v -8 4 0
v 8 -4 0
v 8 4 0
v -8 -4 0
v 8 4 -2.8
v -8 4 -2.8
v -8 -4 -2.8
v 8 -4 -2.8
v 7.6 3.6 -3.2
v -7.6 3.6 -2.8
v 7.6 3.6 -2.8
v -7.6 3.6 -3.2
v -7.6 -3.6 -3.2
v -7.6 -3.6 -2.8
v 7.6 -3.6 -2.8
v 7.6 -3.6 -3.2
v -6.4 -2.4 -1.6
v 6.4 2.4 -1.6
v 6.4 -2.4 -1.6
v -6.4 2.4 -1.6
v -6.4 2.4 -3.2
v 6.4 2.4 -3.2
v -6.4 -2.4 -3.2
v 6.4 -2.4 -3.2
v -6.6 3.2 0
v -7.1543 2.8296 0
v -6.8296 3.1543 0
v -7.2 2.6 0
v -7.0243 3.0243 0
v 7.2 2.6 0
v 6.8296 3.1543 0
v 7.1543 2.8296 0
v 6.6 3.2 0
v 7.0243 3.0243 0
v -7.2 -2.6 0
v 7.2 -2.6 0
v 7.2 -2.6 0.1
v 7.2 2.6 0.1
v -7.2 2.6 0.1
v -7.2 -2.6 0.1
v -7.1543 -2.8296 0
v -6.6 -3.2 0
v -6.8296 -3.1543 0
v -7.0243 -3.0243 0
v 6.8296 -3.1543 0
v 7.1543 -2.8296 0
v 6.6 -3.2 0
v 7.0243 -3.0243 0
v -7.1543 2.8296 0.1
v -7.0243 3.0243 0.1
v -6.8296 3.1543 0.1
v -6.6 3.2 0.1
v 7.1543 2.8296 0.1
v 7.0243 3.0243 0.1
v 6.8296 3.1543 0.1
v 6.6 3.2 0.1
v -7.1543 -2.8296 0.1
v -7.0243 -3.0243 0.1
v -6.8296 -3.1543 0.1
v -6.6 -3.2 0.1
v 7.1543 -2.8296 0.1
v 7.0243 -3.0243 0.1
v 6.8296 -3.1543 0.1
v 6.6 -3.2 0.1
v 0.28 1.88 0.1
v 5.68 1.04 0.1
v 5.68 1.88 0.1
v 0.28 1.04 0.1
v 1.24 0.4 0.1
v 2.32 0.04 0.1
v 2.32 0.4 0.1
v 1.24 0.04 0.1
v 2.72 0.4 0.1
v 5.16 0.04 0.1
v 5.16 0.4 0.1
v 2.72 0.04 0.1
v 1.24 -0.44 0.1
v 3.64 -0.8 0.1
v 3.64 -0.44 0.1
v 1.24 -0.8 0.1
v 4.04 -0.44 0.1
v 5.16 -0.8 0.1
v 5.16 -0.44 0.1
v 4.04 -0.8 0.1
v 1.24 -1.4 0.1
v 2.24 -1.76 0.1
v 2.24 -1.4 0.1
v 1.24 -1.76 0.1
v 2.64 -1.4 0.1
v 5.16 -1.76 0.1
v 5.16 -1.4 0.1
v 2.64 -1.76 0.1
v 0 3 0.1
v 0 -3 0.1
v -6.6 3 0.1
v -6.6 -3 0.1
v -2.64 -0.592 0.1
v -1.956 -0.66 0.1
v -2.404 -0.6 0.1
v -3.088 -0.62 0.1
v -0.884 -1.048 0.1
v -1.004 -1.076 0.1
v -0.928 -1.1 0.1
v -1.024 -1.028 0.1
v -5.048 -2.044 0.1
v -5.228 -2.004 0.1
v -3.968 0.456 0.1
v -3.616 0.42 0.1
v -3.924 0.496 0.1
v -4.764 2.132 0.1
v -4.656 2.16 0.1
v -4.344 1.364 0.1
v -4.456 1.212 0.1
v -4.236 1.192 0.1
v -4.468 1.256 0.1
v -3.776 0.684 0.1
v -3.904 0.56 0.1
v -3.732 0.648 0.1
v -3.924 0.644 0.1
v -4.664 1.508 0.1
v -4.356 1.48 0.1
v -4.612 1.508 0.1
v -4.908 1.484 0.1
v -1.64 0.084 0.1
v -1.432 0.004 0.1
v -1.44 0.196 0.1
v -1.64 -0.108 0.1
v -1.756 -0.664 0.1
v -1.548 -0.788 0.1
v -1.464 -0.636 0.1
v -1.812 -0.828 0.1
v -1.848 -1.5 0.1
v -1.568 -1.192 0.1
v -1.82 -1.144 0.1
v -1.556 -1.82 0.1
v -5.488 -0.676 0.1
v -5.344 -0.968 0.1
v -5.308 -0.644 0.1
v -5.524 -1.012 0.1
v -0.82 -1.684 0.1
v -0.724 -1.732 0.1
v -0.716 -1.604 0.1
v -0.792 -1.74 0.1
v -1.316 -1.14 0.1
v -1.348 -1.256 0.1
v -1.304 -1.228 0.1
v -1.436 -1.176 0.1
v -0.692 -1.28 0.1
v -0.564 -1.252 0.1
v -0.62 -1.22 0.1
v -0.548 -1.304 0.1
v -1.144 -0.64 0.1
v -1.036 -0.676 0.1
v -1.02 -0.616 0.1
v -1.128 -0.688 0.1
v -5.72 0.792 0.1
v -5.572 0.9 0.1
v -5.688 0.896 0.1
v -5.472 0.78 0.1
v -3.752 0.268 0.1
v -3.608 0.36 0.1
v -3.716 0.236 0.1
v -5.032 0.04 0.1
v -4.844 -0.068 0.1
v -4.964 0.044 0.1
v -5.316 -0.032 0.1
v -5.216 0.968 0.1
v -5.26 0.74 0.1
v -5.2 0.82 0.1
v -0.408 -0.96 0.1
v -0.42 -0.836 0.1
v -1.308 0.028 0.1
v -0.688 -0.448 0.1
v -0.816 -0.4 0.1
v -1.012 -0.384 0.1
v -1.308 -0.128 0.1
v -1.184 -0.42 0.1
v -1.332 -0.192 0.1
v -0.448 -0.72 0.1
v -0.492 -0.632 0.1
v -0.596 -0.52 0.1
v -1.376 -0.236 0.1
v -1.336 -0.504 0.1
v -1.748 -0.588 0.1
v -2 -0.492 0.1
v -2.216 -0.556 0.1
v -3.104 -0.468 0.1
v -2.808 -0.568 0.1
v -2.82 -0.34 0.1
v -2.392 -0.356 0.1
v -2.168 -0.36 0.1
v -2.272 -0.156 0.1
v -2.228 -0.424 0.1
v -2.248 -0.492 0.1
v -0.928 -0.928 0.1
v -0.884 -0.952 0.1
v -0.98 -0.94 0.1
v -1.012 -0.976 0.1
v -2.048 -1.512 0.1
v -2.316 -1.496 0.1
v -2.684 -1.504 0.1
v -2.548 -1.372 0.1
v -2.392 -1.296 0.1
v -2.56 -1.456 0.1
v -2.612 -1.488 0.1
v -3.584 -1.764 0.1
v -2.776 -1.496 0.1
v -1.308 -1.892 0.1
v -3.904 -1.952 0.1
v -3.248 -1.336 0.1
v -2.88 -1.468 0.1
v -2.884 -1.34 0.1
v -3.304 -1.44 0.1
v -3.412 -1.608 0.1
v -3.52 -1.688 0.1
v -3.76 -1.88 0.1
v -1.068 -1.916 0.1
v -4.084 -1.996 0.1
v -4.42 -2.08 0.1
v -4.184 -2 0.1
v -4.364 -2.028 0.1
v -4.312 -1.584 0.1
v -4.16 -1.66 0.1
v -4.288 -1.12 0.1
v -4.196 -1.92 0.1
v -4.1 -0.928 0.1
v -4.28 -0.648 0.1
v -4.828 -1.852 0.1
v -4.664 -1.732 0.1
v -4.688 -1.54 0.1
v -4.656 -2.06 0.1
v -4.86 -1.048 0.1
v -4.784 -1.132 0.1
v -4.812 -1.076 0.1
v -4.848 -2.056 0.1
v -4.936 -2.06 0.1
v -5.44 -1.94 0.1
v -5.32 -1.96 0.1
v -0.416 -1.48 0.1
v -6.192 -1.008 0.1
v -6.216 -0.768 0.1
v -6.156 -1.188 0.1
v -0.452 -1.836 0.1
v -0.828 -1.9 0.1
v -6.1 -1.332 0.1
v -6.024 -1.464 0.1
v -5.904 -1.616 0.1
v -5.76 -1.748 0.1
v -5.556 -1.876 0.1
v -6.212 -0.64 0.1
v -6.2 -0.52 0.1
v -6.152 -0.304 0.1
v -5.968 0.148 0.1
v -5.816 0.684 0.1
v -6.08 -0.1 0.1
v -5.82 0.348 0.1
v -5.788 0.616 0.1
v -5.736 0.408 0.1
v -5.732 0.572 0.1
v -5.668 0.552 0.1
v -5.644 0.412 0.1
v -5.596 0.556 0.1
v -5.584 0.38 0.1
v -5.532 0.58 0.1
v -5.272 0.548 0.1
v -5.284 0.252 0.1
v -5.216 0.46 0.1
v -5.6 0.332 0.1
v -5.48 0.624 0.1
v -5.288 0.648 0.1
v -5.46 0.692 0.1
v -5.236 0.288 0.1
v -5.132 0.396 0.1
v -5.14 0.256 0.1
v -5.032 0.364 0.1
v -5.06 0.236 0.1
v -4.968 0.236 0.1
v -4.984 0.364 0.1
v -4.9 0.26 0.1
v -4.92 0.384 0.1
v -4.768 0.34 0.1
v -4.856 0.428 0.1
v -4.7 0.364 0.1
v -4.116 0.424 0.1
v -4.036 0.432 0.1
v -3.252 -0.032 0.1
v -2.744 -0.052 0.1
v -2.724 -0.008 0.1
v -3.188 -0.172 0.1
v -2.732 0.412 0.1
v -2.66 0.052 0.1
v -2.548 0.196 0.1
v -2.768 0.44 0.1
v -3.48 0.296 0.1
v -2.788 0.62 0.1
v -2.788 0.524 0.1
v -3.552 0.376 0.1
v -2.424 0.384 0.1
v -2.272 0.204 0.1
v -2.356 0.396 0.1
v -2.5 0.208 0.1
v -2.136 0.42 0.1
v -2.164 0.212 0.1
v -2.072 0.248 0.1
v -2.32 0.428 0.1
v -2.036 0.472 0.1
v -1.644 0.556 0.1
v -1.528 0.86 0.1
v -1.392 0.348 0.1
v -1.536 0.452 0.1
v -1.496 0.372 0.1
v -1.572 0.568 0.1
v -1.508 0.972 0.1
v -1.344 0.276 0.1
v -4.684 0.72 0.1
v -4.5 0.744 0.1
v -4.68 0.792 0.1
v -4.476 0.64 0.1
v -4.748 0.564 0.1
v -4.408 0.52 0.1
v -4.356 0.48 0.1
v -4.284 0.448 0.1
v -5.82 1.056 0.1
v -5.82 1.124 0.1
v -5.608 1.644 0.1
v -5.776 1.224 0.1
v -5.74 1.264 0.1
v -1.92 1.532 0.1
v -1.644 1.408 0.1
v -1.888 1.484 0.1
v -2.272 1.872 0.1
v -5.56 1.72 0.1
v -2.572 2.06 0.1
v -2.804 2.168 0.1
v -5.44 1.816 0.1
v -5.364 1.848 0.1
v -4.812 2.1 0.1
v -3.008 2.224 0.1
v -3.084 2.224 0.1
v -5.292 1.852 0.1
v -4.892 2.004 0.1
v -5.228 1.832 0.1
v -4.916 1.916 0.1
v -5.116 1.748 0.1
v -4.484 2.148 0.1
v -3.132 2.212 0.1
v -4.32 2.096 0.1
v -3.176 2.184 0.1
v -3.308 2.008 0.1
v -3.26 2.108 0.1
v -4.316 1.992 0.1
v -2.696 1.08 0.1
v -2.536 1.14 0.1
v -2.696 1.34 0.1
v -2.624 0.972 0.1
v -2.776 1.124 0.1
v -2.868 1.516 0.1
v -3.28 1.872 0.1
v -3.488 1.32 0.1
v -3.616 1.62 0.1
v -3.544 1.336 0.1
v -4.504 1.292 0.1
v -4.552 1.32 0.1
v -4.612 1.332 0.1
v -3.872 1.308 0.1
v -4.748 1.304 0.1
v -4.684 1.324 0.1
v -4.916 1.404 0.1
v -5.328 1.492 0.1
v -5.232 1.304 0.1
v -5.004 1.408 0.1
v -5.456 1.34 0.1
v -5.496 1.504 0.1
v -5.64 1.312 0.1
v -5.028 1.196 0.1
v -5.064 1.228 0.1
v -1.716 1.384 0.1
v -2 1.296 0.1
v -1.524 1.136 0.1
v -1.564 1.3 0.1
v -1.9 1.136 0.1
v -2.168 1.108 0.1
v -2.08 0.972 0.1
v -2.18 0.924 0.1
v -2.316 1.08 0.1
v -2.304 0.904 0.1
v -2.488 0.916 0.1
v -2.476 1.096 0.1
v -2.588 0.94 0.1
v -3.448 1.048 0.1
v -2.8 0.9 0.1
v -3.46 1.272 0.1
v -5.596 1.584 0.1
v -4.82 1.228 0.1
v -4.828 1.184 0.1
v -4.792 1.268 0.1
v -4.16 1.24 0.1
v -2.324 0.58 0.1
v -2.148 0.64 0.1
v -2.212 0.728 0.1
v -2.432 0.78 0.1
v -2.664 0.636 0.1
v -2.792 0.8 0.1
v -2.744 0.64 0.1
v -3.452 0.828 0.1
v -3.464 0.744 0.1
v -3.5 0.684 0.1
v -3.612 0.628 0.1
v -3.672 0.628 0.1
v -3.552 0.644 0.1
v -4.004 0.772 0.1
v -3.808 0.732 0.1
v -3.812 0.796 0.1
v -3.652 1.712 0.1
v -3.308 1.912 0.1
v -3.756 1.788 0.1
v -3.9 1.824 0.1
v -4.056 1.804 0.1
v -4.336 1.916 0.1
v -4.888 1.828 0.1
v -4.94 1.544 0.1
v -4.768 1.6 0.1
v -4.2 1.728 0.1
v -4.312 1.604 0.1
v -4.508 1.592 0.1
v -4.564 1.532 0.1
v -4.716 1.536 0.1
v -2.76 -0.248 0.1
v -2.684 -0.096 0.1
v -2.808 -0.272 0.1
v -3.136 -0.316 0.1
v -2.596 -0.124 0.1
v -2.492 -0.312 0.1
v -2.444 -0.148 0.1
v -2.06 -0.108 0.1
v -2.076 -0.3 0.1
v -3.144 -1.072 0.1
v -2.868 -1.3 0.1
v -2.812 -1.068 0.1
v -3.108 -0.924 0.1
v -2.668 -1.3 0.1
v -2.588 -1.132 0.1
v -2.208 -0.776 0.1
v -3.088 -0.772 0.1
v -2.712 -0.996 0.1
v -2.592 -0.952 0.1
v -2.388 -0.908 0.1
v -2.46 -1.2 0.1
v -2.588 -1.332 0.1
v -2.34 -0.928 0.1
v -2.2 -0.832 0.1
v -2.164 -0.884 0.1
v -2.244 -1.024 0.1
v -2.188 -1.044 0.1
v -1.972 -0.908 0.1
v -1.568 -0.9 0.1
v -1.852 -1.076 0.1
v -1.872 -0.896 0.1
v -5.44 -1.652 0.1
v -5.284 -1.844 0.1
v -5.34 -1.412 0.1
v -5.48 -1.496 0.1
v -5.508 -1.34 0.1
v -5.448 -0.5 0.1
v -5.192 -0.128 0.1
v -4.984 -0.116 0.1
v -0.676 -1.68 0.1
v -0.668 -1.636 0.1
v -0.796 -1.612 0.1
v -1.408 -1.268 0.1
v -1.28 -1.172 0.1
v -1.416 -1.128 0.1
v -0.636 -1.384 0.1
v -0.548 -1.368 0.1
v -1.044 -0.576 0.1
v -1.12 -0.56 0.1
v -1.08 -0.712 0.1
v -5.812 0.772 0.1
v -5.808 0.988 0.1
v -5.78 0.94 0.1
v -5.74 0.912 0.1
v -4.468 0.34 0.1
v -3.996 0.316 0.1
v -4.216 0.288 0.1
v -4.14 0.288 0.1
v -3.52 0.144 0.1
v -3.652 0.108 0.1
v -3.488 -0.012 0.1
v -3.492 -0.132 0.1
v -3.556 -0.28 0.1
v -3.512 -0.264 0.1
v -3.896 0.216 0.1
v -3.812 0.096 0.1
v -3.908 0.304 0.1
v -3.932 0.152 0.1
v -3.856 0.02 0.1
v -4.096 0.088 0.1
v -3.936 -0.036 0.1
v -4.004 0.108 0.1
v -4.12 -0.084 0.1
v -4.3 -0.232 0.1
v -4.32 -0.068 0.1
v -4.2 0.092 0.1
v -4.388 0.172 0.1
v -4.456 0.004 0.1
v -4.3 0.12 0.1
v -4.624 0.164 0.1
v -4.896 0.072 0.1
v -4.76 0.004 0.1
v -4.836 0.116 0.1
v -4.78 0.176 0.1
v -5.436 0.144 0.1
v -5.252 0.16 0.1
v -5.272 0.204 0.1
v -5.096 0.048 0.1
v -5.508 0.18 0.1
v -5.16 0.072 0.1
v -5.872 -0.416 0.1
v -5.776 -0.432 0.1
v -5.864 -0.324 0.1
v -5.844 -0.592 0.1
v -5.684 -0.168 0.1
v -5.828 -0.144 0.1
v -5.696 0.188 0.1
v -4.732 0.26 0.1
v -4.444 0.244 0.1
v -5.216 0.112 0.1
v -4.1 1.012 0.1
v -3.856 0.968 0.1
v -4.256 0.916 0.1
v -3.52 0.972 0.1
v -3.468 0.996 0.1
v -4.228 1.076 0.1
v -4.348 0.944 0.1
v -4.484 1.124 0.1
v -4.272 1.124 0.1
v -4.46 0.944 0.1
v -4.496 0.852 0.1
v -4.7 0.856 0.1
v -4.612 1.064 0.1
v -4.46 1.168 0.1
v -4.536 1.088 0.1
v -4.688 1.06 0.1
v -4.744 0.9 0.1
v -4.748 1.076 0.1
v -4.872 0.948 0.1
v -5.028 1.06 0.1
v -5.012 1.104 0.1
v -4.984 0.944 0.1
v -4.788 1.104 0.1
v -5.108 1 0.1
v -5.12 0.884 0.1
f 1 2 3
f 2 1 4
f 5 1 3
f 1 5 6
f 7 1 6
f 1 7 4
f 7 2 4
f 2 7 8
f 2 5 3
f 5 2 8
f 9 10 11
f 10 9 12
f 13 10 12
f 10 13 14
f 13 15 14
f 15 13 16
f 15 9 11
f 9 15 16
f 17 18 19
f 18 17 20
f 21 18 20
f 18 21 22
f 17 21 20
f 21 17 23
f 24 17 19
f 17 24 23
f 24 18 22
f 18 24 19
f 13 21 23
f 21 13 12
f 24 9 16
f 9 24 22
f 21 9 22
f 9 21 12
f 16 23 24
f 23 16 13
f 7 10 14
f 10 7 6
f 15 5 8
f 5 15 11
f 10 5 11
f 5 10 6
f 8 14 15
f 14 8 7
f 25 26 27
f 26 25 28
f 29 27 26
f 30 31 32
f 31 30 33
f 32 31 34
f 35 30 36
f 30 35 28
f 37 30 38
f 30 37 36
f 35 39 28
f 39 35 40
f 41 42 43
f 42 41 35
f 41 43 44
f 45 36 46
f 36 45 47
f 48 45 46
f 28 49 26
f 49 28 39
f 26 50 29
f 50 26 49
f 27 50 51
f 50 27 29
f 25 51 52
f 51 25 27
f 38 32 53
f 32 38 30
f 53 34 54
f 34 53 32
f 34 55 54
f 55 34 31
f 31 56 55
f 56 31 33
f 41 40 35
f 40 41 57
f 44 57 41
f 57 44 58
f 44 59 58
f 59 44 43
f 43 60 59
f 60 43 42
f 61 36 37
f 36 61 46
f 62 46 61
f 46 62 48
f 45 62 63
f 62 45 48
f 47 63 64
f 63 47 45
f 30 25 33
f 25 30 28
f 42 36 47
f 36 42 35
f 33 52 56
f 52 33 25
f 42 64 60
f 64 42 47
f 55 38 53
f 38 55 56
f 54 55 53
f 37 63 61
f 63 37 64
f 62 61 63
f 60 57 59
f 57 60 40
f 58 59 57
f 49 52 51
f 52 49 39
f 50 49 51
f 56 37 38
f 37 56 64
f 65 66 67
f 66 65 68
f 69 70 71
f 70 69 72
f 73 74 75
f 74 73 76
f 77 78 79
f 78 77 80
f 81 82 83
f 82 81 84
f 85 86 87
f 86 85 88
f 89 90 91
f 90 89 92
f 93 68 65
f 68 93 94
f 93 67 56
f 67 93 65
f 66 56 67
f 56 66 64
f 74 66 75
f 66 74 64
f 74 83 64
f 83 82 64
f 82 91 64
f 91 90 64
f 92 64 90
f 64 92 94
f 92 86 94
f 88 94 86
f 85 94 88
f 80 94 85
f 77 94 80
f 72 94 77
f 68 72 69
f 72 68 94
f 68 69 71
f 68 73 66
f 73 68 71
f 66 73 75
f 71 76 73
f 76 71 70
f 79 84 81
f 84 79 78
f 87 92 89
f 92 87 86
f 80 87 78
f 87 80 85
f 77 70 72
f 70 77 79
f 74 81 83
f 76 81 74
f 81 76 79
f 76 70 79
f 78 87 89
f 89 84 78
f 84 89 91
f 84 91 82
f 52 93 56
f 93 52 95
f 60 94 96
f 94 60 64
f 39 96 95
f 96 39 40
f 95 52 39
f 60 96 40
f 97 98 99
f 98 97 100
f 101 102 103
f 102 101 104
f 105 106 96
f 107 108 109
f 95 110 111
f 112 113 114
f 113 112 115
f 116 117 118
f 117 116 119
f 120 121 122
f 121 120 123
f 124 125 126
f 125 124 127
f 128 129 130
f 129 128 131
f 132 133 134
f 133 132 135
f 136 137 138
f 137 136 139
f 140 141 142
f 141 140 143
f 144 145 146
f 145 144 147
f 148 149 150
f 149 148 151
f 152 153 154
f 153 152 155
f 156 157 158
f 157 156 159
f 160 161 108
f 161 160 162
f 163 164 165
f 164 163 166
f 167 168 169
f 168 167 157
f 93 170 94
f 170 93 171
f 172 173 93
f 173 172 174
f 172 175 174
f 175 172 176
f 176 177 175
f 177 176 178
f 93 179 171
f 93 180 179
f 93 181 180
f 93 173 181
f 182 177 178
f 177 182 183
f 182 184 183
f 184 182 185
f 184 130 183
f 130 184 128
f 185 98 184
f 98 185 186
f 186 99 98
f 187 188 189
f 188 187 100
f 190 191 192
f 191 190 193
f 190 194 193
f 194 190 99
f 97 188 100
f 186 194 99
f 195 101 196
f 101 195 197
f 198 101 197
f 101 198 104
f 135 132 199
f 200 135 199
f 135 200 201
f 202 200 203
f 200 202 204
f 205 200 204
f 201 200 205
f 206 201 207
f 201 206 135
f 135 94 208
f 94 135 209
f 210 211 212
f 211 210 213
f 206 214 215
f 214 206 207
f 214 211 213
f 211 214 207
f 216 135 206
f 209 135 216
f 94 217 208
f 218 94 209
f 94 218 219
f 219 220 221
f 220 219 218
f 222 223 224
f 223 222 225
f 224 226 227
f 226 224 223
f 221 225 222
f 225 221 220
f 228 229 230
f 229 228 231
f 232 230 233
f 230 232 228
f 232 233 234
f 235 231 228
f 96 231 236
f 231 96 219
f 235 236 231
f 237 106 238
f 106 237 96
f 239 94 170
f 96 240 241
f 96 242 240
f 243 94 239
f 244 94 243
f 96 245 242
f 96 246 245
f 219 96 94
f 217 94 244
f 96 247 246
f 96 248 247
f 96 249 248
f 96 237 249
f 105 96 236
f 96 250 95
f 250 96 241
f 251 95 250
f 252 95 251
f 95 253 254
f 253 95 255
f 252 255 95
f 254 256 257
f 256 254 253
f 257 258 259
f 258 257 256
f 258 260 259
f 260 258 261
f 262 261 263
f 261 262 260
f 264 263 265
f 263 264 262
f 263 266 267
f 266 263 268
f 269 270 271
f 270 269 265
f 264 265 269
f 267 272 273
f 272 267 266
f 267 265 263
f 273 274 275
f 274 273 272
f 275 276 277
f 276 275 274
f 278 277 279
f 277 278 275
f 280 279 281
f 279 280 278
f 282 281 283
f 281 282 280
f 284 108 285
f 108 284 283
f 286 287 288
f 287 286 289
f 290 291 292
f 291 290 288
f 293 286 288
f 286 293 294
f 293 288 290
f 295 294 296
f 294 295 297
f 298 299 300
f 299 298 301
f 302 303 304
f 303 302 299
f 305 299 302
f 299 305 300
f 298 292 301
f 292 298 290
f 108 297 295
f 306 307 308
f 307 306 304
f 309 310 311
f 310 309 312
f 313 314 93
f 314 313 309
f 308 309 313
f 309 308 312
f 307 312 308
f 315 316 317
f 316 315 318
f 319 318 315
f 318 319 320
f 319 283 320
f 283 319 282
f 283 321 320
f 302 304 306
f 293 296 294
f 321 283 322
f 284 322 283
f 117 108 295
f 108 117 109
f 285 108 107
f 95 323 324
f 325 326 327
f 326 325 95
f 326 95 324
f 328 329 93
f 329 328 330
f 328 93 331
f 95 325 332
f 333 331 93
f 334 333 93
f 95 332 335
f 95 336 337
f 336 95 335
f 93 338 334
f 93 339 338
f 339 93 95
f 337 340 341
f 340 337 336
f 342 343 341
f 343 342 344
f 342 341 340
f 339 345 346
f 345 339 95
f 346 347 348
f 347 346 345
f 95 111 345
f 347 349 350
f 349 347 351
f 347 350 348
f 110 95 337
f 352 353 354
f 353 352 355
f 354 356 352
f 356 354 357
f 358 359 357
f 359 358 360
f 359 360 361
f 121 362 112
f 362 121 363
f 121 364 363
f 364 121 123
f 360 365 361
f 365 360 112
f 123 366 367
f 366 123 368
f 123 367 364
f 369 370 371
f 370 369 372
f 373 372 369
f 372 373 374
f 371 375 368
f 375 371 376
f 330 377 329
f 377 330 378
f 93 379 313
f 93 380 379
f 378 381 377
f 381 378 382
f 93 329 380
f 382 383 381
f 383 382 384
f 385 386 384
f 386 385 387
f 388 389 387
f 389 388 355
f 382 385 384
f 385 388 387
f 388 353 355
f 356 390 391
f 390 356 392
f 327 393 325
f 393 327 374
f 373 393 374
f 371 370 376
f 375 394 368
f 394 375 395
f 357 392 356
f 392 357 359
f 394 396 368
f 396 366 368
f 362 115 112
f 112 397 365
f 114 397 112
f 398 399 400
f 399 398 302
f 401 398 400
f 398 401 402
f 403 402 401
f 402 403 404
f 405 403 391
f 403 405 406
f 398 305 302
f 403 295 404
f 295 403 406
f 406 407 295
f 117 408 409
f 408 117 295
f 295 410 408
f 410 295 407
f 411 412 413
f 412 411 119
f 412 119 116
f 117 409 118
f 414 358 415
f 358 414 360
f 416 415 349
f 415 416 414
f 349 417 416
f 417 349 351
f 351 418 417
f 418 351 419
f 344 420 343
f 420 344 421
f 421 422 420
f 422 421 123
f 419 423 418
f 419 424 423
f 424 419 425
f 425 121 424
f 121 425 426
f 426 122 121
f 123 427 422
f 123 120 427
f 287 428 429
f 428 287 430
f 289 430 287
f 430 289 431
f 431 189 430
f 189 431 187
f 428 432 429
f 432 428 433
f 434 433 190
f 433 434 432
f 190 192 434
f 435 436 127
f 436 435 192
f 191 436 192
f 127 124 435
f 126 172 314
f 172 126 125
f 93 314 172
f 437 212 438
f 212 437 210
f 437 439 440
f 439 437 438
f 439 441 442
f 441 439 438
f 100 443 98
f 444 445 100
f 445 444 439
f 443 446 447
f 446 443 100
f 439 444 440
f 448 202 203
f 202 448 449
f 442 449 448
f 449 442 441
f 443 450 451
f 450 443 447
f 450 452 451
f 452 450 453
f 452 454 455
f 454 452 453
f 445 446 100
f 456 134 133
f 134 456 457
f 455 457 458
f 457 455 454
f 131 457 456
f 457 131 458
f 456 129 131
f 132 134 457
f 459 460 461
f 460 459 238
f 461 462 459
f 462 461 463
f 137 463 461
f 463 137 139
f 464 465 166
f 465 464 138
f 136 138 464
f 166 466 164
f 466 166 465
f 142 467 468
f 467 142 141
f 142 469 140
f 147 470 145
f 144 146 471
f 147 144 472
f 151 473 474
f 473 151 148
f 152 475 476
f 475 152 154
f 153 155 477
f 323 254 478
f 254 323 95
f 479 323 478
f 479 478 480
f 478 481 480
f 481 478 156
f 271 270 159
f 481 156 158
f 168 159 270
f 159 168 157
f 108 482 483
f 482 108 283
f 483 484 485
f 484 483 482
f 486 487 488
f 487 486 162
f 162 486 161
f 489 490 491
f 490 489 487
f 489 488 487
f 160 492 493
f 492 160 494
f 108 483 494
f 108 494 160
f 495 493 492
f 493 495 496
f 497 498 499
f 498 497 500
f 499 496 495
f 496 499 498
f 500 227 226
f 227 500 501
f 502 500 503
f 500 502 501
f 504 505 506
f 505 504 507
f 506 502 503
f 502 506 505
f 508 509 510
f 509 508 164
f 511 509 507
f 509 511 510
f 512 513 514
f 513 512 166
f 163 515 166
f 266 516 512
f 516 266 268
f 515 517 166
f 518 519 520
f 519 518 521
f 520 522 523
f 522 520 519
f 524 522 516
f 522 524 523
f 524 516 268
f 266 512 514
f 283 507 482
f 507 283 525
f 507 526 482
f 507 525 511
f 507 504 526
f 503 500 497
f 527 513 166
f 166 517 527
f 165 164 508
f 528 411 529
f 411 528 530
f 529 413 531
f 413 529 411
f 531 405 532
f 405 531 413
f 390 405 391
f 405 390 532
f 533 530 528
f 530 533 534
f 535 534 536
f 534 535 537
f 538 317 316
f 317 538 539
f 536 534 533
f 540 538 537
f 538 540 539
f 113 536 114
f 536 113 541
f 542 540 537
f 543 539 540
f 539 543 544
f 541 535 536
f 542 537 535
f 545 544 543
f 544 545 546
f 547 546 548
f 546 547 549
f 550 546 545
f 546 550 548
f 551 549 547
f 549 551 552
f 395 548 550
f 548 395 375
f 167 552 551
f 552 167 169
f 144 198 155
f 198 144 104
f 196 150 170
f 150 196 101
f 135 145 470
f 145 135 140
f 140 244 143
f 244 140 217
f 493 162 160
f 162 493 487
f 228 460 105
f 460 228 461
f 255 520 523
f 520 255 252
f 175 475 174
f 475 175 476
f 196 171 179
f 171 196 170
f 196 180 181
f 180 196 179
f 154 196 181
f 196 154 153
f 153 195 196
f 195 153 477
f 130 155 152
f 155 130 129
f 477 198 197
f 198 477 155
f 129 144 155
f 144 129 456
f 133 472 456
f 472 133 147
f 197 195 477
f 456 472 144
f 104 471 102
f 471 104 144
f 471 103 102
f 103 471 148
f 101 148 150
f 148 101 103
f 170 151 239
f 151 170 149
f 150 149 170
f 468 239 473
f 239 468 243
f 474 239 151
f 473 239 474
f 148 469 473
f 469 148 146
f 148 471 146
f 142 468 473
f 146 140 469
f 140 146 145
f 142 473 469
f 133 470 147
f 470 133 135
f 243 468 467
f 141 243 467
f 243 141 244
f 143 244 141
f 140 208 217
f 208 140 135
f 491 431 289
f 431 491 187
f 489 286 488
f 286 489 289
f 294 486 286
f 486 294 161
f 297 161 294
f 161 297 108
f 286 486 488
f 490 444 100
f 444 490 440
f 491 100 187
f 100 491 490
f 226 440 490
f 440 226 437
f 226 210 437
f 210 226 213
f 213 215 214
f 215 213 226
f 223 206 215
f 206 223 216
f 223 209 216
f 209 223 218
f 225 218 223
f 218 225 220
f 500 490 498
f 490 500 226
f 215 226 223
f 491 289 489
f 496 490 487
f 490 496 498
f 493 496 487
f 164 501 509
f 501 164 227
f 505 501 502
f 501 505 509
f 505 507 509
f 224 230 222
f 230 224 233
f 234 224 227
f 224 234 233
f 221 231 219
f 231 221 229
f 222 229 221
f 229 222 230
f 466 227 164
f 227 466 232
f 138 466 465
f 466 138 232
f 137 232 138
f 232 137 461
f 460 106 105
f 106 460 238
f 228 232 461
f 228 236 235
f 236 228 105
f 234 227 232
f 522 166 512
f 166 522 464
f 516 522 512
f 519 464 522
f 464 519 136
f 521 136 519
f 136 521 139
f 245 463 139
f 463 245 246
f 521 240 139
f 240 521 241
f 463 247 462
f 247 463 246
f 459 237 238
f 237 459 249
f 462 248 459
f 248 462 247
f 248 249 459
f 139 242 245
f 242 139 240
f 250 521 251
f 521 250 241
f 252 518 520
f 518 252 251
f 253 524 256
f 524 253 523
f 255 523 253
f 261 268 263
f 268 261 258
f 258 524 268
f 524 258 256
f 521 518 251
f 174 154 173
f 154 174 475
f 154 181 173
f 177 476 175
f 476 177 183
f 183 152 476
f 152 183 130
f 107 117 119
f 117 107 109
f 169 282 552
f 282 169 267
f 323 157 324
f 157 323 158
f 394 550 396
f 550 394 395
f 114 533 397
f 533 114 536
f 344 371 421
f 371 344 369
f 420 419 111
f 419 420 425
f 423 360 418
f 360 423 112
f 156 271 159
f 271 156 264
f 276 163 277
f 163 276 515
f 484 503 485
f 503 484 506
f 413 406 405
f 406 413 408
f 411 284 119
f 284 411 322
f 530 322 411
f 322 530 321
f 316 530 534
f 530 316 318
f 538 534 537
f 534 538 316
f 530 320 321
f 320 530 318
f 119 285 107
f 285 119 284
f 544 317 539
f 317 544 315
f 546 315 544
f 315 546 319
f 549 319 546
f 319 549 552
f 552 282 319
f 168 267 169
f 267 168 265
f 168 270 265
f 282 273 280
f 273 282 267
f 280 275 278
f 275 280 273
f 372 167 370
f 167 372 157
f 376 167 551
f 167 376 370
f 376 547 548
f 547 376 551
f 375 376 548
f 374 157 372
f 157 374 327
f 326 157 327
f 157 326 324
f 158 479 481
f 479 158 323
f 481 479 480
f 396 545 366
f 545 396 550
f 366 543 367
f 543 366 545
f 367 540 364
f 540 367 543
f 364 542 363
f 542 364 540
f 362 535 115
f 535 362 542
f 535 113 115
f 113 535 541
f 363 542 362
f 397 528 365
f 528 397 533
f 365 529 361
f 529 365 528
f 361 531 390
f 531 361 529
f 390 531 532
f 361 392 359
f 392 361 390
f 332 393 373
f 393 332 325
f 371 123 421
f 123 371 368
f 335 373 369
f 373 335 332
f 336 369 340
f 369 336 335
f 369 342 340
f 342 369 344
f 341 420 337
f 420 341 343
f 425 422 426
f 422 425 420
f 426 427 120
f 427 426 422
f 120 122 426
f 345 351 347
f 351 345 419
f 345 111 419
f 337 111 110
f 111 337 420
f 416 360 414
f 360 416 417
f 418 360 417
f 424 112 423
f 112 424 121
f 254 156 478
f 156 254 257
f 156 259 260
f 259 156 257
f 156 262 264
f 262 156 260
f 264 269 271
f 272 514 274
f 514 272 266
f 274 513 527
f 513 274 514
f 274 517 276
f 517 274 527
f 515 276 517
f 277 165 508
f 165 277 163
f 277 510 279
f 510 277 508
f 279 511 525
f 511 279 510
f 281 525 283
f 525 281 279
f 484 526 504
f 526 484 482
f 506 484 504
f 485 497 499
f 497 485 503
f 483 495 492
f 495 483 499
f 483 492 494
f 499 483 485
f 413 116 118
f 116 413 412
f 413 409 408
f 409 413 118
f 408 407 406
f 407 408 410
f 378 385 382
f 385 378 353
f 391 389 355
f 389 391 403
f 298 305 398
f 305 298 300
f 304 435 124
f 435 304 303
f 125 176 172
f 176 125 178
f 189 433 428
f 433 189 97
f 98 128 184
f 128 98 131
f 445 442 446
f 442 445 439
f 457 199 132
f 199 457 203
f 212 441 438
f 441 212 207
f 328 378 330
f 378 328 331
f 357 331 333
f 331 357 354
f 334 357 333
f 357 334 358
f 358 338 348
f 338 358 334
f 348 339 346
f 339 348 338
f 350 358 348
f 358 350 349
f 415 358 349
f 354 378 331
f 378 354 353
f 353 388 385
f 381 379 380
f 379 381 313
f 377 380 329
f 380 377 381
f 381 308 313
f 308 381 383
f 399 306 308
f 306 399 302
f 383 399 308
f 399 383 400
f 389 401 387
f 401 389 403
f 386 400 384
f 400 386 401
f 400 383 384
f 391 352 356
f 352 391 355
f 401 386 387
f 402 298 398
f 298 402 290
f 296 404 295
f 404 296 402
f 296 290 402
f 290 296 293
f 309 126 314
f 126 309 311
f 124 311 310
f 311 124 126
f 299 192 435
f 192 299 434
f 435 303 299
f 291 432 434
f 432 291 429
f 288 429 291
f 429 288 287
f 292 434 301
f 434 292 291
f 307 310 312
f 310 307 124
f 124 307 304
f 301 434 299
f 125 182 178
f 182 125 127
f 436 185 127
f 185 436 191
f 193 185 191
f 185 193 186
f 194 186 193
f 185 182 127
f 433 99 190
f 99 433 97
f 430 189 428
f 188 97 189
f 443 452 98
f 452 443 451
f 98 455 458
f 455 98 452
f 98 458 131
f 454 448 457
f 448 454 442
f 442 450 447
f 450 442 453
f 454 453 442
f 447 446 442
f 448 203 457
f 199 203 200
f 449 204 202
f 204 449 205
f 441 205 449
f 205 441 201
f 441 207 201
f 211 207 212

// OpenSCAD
use <../lib.scad>
use <3069b.scad>
use <6435269e.scad>
function ldraw_lib__3069bd1c() = [
// 0 Tile  1 x  2 with Sucus and Cacti Sign Sticker
// 0 Name: 3069bd1c.dat
// 0 Author: Philippe Hurbain [Philo]
// 0 !LDRAW_ORG Shortcut UPDATE 2025-08
// 0 !LICENSE Licensed under CC BY 4.0 : see CAreadme.txt
// 
// 0 BFC CERTIFY CCW
  [0,"BFC","CERTIFY"],
  [0,"BFC","CCW"],
// 
// 0 !CATEGORY Sticker Shortcut
// 0 !KEYWORDS Bricklink 41757stk01, Rebrickable 10109627, Set 41757
// 
// 0 !HISTORY 2025-08-31 [OrionP] Official Update 2025-08
// 
// 1 16 0 0 0 1 0 0 0 1 0 0 0 1 3069b.dat
  [1,16,0,0,0,1,0,0,0,1,0,0,0,1, ldraw_lib__3069b()],
// 1 16 0 0 0 1 0 0 0 1 0 0 0 1 6435269e.dat
  [1,16,0,0,0,1,0,0,0,1,0,0,0,1, ldraw_lib__6435269e()],
];
module ldraw_lib__3069bd1c(step=0, col=false, unit=2/5, alt=false, line=0.2, solid=!$preview)
    makepoly(ldraw_lib__3069bd1c(), step=step, col=col, unit=unit, alt=alt, line=line, solid=solid);
ldraw_lib__3069bd1c(line=0.2);
